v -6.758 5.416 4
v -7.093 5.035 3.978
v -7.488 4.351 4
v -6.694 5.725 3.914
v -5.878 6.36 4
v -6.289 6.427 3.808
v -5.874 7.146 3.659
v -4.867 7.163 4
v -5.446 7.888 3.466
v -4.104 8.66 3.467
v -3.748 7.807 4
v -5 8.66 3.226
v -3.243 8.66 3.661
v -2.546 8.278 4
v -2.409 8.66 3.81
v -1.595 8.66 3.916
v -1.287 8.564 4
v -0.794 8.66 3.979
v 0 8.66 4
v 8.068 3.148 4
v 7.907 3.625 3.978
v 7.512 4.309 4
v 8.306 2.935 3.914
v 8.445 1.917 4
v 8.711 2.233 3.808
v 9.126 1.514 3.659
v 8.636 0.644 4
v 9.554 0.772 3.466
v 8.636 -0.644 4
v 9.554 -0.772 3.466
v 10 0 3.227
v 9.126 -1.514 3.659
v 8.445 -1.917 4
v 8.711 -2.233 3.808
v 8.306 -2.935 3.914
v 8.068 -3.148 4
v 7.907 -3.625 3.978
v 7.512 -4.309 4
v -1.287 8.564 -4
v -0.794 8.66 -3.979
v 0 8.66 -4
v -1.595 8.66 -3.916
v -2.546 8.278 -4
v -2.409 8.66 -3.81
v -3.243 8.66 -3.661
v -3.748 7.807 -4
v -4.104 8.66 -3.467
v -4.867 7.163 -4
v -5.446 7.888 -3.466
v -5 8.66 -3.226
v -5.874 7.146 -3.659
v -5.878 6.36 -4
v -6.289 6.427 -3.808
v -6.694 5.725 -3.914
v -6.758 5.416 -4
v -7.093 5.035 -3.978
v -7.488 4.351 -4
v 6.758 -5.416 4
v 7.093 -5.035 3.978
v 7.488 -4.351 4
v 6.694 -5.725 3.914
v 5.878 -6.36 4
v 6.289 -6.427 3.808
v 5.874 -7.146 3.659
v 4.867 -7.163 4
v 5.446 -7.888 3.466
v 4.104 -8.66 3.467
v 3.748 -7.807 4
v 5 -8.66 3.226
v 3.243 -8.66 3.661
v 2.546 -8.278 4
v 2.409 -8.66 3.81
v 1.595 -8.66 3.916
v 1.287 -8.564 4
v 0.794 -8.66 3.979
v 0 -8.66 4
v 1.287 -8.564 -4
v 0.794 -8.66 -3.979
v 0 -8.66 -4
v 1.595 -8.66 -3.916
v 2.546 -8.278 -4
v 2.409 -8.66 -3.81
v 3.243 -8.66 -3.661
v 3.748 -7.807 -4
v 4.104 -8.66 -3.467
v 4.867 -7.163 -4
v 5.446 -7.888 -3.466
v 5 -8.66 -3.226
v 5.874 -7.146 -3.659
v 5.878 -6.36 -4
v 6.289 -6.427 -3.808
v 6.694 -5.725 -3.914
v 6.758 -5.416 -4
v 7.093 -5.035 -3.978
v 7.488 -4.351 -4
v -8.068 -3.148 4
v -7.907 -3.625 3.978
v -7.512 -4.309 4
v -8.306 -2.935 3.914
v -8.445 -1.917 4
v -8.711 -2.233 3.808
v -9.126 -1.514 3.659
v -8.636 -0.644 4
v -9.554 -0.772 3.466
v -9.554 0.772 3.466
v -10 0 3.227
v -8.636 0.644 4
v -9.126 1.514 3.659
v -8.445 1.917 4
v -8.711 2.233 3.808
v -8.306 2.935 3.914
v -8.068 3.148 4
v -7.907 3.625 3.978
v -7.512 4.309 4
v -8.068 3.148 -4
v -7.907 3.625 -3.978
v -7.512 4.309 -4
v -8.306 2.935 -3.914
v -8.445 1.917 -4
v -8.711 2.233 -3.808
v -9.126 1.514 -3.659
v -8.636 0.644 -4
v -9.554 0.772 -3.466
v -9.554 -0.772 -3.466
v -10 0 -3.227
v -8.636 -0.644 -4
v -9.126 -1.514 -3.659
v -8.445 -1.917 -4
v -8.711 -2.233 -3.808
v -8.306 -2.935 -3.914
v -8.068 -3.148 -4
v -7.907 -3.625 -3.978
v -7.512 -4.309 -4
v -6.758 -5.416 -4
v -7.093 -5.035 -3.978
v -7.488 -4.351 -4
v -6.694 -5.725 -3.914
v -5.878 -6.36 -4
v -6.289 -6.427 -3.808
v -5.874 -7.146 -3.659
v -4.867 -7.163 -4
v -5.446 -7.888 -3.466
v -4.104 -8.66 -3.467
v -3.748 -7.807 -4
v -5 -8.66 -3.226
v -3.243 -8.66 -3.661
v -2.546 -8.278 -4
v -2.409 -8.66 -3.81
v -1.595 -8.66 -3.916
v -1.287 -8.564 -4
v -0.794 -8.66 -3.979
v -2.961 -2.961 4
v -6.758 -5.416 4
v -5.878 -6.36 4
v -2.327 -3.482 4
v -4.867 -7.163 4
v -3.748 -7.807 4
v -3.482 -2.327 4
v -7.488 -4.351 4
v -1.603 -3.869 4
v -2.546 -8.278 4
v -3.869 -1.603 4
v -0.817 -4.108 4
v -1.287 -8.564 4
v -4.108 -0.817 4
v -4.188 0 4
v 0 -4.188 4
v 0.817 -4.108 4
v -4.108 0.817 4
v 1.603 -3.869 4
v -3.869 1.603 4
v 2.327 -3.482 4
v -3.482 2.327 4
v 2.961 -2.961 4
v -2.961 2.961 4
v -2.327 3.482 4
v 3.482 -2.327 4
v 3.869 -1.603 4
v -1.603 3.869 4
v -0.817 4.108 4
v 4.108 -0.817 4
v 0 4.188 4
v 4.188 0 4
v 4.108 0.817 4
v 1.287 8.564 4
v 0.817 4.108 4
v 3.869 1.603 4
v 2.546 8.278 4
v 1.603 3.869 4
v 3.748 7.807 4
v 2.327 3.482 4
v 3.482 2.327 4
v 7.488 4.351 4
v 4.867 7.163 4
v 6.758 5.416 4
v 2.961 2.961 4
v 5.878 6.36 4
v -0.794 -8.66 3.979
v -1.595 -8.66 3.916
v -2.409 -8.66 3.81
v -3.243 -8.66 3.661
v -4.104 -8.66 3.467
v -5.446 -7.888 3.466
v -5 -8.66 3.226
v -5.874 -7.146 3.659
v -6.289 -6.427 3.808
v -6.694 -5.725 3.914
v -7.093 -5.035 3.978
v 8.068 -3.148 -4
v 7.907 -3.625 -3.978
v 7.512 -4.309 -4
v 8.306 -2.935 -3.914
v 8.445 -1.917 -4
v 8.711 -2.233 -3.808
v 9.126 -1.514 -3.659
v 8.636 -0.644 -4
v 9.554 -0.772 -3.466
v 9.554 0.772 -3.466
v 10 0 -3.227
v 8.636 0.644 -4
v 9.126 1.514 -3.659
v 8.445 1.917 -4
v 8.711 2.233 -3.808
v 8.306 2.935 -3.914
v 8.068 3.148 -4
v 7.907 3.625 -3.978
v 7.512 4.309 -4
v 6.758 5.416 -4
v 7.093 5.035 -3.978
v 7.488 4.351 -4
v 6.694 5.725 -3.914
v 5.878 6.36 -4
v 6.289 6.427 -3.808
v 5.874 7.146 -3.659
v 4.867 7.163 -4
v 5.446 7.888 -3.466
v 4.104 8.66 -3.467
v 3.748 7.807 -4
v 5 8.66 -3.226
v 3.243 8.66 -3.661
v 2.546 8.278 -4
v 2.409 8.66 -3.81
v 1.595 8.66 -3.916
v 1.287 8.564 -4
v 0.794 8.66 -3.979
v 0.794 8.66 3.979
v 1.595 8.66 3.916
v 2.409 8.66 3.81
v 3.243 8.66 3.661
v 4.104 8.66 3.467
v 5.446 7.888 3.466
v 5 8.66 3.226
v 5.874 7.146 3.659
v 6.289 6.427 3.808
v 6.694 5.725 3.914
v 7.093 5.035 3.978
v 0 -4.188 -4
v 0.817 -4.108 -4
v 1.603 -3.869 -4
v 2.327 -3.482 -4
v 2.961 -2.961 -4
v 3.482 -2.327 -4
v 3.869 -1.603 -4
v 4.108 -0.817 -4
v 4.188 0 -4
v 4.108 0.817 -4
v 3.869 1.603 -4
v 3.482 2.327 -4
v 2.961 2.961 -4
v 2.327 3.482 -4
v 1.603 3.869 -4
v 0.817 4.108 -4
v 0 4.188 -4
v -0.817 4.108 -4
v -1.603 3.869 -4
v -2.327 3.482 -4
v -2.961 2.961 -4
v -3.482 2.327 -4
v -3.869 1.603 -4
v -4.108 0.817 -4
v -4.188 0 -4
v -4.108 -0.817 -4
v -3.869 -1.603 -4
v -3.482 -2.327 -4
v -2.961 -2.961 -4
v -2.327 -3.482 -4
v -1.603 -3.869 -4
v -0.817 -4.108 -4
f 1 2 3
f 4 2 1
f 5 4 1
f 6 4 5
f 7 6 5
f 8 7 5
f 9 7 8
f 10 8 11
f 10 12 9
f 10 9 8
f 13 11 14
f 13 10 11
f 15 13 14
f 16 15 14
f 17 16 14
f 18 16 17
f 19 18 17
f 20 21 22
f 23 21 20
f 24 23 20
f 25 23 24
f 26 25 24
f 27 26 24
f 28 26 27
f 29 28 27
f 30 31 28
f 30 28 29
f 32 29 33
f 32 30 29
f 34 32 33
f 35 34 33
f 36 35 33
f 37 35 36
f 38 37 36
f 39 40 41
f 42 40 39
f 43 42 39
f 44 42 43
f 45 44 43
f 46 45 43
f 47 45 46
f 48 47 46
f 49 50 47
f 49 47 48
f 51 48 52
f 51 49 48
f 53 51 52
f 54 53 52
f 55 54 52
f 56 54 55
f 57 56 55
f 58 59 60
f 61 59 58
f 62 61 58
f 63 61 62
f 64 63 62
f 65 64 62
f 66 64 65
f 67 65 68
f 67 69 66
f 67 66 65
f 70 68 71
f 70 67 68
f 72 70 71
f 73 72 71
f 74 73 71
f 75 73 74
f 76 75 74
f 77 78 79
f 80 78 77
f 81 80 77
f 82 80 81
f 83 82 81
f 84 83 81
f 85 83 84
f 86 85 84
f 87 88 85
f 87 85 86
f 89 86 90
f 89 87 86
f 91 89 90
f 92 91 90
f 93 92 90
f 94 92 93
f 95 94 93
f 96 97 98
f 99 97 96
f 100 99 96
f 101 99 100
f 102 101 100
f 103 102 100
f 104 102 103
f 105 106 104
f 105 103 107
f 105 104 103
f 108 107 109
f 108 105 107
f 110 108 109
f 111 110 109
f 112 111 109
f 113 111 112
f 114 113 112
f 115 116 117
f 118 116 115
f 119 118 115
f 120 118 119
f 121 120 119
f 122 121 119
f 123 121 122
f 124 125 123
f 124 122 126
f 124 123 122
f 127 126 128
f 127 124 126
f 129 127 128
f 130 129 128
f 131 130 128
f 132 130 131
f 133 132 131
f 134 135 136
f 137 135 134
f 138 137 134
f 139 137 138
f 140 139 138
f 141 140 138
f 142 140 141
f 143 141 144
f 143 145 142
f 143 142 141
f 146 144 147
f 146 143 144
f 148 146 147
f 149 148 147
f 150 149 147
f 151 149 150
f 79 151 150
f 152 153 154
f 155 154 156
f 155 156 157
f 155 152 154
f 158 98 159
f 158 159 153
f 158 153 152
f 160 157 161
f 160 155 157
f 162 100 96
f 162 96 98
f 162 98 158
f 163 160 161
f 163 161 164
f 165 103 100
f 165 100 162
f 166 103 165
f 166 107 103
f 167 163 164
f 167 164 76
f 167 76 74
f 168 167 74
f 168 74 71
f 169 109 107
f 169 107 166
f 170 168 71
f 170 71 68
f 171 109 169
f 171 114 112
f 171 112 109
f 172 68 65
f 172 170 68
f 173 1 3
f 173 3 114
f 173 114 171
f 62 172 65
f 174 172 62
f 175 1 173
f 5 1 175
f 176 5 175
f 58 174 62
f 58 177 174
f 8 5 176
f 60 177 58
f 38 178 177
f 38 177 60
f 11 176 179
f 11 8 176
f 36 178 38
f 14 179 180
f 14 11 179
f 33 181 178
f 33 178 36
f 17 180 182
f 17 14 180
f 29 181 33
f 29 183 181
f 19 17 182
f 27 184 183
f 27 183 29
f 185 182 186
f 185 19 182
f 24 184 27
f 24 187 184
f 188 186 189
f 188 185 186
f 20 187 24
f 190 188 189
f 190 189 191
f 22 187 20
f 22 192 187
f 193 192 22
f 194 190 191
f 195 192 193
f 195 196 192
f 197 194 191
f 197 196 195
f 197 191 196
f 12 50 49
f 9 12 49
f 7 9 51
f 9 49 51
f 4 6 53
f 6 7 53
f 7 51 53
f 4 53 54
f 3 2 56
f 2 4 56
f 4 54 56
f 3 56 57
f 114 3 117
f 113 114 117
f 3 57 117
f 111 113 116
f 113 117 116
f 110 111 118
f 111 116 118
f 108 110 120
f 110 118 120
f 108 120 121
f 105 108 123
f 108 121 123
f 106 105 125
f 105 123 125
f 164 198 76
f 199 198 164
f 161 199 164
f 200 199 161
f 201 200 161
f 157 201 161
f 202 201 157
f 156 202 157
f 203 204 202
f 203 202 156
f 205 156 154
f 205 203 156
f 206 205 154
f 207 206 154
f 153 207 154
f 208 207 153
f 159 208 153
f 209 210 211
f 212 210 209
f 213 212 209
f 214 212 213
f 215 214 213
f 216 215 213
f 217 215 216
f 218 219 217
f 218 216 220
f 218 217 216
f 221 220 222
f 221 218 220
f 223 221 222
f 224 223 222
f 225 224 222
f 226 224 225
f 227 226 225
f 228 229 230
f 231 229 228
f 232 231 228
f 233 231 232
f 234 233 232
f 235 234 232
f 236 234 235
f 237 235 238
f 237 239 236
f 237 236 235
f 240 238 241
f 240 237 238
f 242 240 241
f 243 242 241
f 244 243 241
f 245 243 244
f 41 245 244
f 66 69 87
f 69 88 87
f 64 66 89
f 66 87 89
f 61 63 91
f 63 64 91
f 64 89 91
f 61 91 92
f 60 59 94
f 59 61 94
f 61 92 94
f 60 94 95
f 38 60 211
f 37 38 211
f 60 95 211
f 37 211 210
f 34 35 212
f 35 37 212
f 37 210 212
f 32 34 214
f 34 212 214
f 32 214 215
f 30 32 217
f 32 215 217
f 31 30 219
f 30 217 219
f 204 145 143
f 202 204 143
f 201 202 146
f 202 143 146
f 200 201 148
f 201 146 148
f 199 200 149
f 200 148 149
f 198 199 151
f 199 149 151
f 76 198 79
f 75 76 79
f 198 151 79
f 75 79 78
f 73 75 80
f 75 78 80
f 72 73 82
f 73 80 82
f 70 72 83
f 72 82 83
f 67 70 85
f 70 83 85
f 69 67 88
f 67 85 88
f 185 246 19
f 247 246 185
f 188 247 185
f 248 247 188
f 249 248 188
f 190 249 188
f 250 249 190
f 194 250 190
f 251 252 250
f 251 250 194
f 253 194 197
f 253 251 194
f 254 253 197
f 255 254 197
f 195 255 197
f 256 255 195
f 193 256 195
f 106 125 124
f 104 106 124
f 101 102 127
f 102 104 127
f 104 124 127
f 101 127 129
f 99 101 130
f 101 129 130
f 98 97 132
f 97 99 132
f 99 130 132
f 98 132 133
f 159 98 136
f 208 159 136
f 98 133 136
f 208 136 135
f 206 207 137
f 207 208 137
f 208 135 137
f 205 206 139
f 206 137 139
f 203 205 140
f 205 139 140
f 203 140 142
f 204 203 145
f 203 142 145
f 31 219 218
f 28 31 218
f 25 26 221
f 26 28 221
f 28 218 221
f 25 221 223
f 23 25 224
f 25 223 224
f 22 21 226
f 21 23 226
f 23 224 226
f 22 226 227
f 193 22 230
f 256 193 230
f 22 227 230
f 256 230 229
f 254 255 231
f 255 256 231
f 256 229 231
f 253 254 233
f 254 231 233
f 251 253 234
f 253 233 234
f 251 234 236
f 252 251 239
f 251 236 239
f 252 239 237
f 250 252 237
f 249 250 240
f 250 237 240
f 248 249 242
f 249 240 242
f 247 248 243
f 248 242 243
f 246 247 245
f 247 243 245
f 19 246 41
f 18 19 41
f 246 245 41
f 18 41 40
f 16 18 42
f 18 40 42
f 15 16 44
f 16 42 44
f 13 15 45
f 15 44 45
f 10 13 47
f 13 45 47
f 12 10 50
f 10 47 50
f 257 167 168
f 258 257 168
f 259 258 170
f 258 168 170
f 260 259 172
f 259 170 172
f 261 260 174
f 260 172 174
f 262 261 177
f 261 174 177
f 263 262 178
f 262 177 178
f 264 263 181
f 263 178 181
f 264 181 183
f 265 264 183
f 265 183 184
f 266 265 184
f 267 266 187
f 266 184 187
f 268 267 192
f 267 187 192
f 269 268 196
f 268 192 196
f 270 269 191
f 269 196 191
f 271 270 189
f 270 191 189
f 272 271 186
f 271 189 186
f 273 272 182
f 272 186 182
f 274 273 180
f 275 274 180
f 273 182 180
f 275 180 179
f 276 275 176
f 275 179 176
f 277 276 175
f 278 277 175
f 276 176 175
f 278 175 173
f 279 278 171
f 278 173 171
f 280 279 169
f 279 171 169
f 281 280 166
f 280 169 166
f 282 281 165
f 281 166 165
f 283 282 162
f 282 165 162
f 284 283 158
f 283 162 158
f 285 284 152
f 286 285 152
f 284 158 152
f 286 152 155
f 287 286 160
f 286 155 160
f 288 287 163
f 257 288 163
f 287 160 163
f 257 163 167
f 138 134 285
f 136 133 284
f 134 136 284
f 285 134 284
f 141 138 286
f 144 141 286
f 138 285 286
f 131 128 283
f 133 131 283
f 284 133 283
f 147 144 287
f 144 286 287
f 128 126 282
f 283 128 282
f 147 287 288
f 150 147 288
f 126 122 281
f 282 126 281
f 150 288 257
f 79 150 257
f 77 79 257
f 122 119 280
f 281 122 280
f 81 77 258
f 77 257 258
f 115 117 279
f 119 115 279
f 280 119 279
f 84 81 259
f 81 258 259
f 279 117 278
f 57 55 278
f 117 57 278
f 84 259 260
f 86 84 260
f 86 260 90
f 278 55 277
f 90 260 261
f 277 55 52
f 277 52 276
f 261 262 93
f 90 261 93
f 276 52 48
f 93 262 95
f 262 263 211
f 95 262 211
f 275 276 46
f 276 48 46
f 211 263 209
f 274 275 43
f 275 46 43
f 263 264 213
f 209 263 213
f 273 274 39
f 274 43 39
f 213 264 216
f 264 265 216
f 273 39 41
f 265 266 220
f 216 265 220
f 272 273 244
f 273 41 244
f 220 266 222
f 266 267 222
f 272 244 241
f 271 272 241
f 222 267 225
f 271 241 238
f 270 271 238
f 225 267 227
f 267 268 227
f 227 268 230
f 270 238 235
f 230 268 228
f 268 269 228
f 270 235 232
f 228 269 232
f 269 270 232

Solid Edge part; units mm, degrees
sketch "Sketch1" plane through (0, 0, 0) normal (0, 0, 1) x (1, 0, 0)
  line L0 (-5, -8.6603) -> (5, -8.6603)
  line L1 (5, -8.6603) -> (10, 0)
  line L2 (10, 0) -> (5, 8.6603)
  line L3 (5, 8.6603) -> (-5, 8.6603)
  line L4 (-5, 8.6603) -> (-10, 0)
  line L5 (-10, 0) -> (-5, -8.6603)
extrude "Protrusion1" add sketch "Sketch1" along normal mid plane 8
hole "Hole_1" at (0, 0, 4) direction (0, 0, -1) diameter 8.376 end through all
sketch "Sketch2" plane through (0, 0, 0) normal (1, 0, 0) x (0, 1, 0)
  line L0 (8.6603, -4) -> (27.7764, 7.0367)
revolve "RevolvedCutout1" cut sketch "Sketch2" angle 360 about axis through (0, 0, -57) along (0, 0, 1) material side at (0, 18.2434, 1.475)
mirror "Mirror1" about plane through (0, 0, 0) normal (0, 0, 1) of "RevolvedCutout1"
properties part number "7" material "Fe 410 W"
